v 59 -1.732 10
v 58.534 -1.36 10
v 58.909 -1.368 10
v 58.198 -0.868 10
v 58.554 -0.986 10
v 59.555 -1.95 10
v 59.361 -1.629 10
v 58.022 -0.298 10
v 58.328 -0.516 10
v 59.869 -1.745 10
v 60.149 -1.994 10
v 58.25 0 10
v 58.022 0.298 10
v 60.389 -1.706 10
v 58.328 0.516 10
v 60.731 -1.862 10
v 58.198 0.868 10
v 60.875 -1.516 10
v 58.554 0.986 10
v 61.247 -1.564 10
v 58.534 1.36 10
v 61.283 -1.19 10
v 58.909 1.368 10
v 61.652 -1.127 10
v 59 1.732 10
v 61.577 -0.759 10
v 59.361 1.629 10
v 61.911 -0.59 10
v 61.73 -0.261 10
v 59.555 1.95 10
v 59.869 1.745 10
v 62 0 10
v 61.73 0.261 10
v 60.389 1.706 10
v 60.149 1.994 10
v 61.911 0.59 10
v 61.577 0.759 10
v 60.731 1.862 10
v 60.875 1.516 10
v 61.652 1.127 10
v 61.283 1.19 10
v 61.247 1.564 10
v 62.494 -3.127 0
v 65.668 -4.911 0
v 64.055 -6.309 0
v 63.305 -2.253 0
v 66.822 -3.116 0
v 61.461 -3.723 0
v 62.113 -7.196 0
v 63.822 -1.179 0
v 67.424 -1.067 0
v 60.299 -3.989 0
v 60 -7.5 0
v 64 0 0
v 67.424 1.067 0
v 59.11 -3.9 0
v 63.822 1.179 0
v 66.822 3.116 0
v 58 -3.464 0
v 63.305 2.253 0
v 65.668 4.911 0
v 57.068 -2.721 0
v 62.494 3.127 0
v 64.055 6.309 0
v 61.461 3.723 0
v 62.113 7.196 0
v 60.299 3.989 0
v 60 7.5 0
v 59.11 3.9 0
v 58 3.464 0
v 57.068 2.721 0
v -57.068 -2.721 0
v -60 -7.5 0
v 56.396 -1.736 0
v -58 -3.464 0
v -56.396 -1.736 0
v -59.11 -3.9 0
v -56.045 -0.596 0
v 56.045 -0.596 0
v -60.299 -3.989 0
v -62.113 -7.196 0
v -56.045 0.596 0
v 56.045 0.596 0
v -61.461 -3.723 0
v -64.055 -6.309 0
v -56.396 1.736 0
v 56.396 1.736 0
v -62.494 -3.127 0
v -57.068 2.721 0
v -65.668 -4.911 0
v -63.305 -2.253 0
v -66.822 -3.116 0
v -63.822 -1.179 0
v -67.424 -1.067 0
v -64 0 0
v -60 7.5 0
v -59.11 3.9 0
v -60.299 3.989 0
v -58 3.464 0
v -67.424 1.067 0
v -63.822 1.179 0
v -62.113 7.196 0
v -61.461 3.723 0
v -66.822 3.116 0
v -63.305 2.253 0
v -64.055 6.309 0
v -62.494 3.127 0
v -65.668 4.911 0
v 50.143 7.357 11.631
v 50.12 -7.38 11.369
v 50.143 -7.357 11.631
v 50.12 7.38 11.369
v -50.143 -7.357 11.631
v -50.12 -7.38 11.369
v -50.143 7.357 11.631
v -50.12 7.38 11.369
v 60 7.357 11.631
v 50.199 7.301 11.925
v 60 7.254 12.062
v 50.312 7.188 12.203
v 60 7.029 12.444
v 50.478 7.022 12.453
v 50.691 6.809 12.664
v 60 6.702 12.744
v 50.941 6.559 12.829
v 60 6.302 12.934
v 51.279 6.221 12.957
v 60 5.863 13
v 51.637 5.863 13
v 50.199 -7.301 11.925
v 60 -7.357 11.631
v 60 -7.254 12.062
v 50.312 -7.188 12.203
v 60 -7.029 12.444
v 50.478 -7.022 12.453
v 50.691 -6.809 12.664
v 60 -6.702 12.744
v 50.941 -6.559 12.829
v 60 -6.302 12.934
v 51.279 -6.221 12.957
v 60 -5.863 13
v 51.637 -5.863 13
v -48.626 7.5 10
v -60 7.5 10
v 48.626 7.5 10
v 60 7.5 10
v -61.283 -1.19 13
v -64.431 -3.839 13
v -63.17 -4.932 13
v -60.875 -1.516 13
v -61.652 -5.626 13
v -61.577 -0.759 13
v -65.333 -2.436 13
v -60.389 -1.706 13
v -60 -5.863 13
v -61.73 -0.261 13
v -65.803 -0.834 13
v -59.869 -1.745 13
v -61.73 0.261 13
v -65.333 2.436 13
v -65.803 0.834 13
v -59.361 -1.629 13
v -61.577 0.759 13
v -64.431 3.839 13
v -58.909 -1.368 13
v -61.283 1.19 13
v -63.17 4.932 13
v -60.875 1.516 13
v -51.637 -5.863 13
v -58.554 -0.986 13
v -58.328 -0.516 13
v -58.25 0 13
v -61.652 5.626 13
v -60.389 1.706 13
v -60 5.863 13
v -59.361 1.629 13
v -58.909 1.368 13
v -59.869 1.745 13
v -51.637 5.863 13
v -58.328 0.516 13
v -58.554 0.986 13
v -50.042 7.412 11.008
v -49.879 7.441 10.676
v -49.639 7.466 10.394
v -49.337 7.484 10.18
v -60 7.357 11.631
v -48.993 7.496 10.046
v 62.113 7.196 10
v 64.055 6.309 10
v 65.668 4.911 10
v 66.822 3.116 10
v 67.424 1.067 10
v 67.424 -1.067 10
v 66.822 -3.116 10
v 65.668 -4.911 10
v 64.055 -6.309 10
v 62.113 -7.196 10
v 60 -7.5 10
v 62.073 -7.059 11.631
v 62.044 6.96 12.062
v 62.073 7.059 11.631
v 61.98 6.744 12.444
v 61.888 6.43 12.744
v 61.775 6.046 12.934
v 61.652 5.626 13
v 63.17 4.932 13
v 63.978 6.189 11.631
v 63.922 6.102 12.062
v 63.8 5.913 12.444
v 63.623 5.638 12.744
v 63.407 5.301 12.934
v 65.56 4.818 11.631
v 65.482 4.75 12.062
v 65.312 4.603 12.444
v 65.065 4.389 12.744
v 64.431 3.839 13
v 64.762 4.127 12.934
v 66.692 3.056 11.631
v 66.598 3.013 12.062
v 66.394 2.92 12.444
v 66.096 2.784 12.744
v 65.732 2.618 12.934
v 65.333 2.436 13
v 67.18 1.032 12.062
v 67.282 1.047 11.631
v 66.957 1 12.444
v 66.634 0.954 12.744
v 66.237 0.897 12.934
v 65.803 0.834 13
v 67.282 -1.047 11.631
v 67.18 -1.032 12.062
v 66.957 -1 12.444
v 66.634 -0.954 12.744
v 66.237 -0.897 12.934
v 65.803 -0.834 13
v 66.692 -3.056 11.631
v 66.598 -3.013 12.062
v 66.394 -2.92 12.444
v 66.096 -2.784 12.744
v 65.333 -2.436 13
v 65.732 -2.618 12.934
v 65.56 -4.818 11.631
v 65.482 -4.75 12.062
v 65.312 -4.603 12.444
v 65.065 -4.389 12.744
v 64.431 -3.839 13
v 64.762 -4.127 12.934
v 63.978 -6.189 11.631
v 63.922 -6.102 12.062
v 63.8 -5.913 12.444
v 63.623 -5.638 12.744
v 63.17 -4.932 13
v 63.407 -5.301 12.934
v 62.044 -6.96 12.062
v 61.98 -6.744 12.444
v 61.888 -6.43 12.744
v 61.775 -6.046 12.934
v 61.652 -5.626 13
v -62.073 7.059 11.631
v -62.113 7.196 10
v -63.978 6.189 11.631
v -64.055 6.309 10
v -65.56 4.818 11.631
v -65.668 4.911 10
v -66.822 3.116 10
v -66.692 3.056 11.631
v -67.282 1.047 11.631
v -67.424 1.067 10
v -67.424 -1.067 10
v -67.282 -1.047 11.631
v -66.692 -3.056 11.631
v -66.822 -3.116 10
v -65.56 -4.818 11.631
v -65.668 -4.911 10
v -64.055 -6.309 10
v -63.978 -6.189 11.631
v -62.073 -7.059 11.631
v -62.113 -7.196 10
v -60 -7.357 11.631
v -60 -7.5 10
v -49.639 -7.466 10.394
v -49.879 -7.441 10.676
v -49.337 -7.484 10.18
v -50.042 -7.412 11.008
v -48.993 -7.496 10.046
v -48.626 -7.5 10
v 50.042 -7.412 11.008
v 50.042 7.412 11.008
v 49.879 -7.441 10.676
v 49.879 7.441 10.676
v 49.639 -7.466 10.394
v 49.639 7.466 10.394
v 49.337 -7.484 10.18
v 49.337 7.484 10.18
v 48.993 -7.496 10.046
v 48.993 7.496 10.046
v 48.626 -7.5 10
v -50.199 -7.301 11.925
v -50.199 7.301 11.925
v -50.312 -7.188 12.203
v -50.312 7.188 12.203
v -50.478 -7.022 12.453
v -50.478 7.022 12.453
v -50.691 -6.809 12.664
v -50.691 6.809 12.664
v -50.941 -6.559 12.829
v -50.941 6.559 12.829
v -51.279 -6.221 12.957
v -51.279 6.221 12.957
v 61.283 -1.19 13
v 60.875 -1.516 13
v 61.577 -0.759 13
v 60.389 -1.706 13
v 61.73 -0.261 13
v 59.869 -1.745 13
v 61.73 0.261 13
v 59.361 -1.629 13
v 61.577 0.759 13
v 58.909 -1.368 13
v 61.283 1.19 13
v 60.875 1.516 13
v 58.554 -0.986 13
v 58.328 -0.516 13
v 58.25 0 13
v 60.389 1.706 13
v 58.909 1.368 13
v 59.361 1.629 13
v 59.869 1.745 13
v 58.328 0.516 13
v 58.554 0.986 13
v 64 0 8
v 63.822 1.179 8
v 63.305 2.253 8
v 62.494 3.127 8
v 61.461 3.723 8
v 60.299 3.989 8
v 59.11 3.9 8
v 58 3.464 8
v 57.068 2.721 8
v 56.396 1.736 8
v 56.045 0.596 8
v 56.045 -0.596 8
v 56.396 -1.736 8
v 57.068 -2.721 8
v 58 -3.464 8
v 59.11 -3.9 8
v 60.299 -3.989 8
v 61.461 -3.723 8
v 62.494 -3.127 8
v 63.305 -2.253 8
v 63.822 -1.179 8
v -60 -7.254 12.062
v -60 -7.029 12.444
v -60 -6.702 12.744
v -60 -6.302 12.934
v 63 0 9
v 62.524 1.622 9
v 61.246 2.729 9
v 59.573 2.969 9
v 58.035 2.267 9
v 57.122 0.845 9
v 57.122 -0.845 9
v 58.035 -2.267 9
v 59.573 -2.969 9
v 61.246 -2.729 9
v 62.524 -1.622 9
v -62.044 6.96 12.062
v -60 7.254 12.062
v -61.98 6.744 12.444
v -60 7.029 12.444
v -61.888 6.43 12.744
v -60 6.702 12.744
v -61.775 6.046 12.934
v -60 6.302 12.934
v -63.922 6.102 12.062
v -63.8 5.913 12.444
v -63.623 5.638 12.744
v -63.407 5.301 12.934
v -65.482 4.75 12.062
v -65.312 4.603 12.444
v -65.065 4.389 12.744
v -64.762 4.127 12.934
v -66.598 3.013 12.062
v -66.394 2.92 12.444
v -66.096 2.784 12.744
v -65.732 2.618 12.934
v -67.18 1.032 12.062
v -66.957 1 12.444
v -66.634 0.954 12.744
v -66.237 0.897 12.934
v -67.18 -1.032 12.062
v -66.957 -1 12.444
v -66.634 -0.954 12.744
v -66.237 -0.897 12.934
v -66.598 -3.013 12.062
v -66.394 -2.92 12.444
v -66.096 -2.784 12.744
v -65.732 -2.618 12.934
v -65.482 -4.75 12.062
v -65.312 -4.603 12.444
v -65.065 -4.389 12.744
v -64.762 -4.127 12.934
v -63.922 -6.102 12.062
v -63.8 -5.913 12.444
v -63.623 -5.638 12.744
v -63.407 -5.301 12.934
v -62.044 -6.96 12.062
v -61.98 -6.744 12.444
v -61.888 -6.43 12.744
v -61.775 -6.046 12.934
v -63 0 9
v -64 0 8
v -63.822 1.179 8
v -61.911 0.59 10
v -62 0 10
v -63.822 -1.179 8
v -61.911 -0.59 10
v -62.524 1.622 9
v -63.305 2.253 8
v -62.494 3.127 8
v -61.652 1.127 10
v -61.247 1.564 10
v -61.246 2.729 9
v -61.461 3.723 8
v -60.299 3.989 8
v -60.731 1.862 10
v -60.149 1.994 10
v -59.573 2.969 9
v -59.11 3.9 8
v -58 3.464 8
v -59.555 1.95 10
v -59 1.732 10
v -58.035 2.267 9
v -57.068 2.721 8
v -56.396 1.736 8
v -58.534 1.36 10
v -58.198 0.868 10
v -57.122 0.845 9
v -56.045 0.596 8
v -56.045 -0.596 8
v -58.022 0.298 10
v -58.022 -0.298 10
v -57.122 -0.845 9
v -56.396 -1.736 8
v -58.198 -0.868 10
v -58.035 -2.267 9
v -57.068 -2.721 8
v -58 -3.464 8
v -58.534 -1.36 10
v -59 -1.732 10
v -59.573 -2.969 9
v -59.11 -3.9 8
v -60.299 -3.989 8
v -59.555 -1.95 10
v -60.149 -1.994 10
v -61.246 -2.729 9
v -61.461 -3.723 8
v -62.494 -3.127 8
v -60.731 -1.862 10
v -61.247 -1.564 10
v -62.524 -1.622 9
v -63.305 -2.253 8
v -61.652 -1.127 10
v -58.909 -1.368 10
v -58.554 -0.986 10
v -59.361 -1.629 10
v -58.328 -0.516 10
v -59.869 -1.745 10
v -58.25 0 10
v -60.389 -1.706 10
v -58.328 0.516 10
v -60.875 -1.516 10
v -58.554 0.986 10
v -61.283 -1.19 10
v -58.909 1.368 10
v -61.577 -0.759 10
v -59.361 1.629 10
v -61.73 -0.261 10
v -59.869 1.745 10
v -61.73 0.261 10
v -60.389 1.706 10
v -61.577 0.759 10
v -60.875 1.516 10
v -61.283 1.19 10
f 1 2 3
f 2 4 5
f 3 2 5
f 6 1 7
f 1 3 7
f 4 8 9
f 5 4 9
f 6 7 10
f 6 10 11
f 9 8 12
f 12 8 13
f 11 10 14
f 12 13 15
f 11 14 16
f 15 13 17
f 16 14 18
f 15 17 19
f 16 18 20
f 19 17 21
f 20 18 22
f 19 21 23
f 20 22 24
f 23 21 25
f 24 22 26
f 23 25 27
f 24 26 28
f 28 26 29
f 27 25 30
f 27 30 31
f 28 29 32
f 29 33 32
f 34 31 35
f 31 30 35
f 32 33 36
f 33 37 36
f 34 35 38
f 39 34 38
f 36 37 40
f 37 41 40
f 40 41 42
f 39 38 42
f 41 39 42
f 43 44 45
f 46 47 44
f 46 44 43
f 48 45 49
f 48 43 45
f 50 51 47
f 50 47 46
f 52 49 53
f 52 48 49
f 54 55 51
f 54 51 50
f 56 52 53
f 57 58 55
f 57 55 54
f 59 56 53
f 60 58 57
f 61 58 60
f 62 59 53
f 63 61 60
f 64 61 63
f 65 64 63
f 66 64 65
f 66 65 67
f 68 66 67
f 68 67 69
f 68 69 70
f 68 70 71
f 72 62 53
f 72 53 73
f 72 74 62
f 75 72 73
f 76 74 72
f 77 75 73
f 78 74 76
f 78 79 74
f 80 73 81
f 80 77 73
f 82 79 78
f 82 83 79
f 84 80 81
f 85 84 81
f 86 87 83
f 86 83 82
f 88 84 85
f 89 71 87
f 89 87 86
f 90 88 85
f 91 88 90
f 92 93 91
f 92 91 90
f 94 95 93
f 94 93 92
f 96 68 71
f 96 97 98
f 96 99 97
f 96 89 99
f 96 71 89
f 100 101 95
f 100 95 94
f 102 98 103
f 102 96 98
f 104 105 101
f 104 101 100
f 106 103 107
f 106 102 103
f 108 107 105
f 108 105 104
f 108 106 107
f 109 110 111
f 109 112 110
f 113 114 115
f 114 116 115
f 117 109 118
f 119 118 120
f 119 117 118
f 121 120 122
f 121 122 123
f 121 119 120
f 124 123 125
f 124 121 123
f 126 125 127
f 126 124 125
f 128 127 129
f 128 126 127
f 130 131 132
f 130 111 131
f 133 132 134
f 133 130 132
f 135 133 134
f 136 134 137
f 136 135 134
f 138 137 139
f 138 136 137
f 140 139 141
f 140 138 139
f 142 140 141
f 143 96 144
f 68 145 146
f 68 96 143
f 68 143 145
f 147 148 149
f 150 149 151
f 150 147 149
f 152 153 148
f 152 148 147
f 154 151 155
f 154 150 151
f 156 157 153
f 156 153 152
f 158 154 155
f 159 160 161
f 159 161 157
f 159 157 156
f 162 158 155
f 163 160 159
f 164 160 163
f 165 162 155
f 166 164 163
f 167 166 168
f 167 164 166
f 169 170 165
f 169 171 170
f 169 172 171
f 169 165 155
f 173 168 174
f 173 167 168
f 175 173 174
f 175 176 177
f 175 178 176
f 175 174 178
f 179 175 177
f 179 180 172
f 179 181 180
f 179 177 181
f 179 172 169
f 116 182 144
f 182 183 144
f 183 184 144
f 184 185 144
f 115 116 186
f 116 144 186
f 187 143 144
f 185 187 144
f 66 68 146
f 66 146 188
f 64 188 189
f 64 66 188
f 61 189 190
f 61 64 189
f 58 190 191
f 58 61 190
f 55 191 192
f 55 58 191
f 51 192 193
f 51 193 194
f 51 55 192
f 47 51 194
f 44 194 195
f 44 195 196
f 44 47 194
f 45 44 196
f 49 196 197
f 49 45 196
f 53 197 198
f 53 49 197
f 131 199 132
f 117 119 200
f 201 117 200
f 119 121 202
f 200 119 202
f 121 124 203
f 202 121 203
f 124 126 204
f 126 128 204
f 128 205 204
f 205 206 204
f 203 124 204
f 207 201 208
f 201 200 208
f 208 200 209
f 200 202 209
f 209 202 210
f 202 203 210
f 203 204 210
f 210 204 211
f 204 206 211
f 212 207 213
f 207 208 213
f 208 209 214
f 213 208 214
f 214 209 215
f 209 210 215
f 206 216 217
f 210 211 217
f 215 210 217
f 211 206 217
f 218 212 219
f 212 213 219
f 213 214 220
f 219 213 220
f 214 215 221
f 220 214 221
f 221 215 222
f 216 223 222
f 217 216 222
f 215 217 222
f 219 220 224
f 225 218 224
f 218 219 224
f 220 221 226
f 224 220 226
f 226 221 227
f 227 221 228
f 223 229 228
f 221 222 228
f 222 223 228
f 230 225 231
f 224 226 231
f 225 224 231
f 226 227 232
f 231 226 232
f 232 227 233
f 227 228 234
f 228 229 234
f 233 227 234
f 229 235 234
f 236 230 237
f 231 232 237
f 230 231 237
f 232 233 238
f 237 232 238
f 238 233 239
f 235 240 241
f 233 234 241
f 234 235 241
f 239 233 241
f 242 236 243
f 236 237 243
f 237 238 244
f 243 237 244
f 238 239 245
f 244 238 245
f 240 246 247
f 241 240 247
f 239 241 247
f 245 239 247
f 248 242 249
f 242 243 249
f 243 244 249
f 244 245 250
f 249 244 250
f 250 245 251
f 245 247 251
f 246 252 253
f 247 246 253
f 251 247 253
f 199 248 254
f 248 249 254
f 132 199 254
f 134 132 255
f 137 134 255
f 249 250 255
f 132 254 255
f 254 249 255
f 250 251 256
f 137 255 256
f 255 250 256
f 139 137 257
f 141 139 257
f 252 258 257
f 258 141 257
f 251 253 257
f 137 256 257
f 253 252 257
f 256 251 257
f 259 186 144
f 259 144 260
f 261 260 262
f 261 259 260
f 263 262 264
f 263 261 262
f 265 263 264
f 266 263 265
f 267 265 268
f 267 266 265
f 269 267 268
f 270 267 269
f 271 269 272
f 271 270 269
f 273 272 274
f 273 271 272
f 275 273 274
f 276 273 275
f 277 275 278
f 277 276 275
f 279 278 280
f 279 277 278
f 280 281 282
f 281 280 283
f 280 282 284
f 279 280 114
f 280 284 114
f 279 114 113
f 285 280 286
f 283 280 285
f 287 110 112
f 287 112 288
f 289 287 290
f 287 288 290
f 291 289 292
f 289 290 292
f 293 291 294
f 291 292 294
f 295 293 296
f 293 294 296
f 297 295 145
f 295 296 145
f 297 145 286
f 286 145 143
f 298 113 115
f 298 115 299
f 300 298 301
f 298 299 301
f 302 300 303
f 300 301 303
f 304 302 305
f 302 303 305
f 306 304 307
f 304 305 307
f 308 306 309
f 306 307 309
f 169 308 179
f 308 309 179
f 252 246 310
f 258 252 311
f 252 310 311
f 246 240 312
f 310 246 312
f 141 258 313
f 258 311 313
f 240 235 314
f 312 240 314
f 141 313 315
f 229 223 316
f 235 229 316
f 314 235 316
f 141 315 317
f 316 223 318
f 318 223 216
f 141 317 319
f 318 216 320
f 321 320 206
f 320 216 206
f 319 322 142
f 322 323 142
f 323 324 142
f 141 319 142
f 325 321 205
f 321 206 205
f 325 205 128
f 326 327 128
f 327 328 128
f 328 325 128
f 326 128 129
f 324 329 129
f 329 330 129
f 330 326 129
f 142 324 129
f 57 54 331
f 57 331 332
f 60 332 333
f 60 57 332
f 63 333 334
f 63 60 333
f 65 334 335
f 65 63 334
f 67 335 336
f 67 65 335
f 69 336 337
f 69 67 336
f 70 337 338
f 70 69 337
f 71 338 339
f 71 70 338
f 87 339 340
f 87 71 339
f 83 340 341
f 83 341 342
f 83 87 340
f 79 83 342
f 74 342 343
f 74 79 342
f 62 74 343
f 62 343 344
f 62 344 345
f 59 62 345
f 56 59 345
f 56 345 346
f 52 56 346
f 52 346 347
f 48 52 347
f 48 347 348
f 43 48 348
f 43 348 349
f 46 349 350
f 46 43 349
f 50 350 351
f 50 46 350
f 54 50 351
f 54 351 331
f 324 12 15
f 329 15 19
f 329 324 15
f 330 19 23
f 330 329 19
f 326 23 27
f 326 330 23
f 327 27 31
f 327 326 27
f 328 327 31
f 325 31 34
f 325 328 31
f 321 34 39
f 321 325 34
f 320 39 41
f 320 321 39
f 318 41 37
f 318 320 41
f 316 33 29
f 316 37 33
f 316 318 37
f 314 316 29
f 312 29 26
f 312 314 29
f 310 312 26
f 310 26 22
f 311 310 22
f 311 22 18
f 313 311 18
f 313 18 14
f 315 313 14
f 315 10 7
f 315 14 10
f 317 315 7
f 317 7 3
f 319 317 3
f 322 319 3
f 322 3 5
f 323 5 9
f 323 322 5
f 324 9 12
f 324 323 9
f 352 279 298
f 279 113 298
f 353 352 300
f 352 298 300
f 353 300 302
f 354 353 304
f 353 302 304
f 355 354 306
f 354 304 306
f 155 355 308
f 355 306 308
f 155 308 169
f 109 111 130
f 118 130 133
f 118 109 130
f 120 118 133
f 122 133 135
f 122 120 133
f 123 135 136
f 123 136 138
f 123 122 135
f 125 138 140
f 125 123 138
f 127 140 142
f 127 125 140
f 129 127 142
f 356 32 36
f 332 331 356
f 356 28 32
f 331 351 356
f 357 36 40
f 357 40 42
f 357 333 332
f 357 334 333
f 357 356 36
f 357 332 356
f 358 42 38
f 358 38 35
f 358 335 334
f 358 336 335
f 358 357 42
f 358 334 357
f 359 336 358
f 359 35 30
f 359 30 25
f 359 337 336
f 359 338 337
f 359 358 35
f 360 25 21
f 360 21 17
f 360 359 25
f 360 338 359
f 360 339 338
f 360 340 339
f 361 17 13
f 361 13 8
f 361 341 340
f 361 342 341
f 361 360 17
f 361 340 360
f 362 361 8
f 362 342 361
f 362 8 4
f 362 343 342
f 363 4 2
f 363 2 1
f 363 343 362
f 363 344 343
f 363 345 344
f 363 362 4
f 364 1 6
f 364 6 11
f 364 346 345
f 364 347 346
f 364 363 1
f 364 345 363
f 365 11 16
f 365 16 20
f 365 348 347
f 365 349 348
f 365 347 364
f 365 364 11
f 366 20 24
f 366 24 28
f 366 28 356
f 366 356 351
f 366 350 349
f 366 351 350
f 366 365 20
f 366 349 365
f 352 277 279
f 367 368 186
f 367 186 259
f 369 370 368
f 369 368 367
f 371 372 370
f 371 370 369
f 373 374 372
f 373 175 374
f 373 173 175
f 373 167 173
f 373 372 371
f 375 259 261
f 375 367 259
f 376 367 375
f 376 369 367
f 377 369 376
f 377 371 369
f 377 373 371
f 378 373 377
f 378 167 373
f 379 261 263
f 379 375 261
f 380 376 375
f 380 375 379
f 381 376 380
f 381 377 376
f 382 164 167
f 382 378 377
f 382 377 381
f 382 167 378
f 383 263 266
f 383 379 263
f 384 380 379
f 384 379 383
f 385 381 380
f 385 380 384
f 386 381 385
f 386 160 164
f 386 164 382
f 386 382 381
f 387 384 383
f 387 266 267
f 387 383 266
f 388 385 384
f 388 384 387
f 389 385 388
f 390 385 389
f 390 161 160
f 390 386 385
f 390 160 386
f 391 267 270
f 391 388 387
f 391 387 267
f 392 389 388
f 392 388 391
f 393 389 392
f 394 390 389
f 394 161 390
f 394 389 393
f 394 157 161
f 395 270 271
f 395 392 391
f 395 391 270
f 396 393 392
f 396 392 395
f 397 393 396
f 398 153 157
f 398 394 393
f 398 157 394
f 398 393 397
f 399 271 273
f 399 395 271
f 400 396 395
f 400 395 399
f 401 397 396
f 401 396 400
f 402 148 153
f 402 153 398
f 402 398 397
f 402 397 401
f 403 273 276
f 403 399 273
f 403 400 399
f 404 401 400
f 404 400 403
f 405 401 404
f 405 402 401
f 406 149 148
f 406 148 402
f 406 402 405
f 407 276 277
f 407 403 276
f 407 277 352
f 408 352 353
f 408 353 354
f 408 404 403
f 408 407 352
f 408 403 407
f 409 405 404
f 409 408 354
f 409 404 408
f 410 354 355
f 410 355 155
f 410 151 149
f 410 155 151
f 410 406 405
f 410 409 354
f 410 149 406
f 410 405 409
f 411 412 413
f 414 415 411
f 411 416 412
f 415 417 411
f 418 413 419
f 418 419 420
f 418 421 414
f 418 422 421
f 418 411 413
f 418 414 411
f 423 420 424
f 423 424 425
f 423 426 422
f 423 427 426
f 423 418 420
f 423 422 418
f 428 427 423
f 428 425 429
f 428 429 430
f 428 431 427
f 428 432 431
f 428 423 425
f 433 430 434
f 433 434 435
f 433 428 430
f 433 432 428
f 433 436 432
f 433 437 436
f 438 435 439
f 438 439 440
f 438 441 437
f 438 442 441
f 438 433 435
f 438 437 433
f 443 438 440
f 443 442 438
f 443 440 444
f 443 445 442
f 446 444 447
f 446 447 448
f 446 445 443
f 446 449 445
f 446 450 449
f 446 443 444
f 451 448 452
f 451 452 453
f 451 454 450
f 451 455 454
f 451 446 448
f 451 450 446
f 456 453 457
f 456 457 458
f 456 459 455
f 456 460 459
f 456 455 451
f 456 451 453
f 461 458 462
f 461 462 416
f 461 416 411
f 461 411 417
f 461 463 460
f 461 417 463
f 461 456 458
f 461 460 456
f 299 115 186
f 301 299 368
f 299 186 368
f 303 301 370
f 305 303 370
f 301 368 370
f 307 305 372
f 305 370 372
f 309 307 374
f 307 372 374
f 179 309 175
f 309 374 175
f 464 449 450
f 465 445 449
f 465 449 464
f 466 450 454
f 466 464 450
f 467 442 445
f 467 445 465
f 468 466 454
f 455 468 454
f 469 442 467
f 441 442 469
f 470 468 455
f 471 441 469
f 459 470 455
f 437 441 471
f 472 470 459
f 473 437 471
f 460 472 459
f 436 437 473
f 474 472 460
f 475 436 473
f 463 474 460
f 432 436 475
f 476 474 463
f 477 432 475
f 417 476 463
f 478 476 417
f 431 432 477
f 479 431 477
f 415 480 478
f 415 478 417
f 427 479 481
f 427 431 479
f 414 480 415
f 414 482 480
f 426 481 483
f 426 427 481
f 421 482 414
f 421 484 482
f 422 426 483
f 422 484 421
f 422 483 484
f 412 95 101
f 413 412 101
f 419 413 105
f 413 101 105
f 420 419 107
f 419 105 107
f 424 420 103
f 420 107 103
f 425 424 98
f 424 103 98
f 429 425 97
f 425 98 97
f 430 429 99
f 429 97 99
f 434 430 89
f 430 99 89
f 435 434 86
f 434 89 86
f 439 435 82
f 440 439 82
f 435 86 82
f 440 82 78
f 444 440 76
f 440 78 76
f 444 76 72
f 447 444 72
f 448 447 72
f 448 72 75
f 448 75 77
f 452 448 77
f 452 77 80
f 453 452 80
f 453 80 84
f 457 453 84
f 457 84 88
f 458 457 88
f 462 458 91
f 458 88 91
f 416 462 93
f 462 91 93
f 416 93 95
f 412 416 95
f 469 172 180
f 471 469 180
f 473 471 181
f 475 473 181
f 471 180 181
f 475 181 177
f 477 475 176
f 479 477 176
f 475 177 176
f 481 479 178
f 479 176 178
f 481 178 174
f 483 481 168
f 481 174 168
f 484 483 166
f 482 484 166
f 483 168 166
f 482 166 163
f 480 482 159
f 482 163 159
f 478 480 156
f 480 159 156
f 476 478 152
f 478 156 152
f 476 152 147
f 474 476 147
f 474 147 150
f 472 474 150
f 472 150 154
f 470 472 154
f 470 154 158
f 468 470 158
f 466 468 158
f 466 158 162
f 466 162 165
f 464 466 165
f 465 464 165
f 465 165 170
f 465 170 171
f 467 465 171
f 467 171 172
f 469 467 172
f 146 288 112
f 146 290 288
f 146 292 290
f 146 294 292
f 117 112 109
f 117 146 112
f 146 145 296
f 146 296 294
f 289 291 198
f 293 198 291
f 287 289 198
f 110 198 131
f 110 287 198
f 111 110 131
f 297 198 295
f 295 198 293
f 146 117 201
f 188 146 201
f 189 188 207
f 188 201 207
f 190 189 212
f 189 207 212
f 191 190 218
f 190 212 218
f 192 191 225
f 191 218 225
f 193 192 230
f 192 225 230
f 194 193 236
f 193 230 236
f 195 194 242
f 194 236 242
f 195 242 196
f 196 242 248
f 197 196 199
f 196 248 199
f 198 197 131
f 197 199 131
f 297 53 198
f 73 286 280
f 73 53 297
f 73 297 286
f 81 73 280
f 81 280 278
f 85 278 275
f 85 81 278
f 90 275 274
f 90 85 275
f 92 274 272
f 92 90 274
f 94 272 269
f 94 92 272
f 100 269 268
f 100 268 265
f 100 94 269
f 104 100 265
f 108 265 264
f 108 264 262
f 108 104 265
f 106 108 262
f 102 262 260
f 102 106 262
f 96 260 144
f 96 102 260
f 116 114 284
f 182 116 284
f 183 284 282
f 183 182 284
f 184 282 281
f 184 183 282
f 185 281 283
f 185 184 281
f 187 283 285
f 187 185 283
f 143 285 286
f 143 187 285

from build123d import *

# Parameters (mm, degrees)
BOSS_EXTRUDE1_DEPTH  = 10
BOSS_EXTRUDE2_DEPTH  = 3
BOSS_EXTRUDE2_TAPER  = 5
FILLET1_R            = 1.5
SKETCH3_R            = 1.75
CUT_EXTRUDE1_DEPTH   = 70.14839116
SKETCH4_R            = 4
CUT_EXTRUDE2_DEPTH   = 10
FILLET1_OF_MIRROR3_R = 1.5
CHAMFER1_SIZE        = 2


with BuildPart() as part:
    # Sketch1 → Boss-Extrude1 (new body)
    with BuildSketch(Plane.XY):
        with BuildLine():
            Line((-60, 7.5), (60, 7.5))
            ThreePointArc((60, 7.5), (67.5, 0), (60, -7.5))
            Line((60, -7.5), (-60, -7.5))
            ThreePointArc((-60, -7.5), (-67.5, 0), (-60, 7.5))
        make_face()
    extrude(amount=BOSS_EXTRUDE1_DEPTH)

    # Sketch2 → Boss-Extrude2 (add)
    with BuildSketch(Plane.XY.offset(10)):
        with BuildLine():
            Line((-50, -7.5), (-50, 7.5))
            Line((-50, 7.5), (-60, 7.5))
            ThreePointArc((-60, 7.5), (-67.5, 0), (-60, -7.5))
            Line((-60, -7.5), (-50, -7.5))
        make_face()
    boss_extrude2 = extrude(amount=BOSS_EXTRUDE2_DEPTH, taper=BOSS_EXTRUDE2_TAPER)

    # Fillet1
    fillet1_edges = [part.edges().sort_by_distance(p)[0] for p in [
        (-50.262465991, 0, 13),
        (-55.131232995, 7.237534009, 13),
        (-67.237534009, 0, 13),
        (-55.131232995, -7.237534009, 13),
        (-50, 0, 10),
    ]]
    fillet(fillet1_edges, radius=FILLET1_R)

    # Sketch3 → Cut-Extrude1 (cut, through all)
    with BuildSketch(Plane.XY.offset(13)):
        with Locations((-60, 0)):
            Circle(SKETCH3_R)
    cut_extrude1 = extrude(amount=-CUT_EXTRUDE1_DEPTH, mode=Mode.SUBTRACT)

    # Sketch4 → Cut-Extrude2 (cut)
    with BuildSketch(Plane(origin=(0, 0, 0), x_dir=(-1, 0, 0), z_dir=(0, 0, -1))):
        with Locations((60, 0)):
            Circle(SKETCH4_R)
    cut_extrude2 = extrude(amount=-CUT_EXTRUDE2_DEPTH, mode=Mode.SUBTRACT)

    # Mirror3: Boss-Extrude2, Cut-Extrude1, Cut-Extrude2 across plane
    add(boss_extrude2.mirror(Plane(origin=(0, 0, 0), x_dir=(0, 0, 1), z_dir=(1, 0, 0))))
    add(cut_extrude1.mirror(Plane(origin=(0, 0, 0), x_dir=(0, 0, 1), z_dir=(1, 0, 0))), mode=Mode.SUBTRACT)
    add(cut_extrude2.mirror(Plane(origin=(0, 0, 0), x_dir=(0, 0, 1), z_dir=(1, 0, 0))), mode=Mode.SUBTRACT)

    # Fillet1 of Mirror3
    fillet1_of_mirror3_edges = [part.edges().sort_by_distance(p)[0] for p in [
        (50.262465991, 0, 13),
        (55.131232995, 7.237534009, 13),
        (67.237534009, 0, 13),
        (55.131232995, -7.237534009, 13),
        (50, 0, 10),
    ]]
    fillet(fillet1_of_mirror3_edges, radius=FILLET1_OF_MIRROR3_R)

    # Chamfer1
    chamfer1_edges = [part.edges().sort_by_distance(p)[0] for p in [
        (56, 0, 10),
        (-56, 0, 10),
    ]]
    chamfer(chamfer1_edges, length=CHAMFER1_SIZE)


solid = part.part
